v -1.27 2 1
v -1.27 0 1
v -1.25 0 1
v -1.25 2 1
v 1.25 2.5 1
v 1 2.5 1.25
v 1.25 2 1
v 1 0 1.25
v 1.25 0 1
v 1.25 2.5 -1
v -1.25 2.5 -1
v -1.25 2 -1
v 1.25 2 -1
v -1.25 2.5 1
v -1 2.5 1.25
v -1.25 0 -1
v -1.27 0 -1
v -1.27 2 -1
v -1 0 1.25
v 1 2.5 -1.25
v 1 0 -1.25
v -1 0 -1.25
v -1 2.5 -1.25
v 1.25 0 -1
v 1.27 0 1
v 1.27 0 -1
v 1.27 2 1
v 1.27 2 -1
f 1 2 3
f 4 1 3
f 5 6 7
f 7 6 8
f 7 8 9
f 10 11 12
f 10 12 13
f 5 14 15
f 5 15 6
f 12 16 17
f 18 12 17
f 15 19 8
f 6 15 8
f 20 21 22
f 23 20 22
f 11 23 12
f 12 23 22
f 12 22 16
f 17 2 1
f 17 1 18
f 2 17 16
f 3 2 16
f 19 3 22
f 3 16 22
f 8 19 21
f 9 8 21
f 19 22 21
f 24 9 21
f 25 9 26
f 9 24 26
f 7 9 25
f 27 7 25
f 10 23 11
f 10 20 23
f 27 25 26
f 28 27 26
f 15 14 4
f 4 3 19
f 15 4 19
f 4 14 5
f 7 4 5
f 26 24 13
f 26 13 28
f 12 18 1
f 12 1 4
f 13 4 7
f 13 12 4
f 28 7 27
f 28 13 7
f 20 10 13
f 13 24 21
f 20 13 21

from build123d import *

# Parameters (mm, degrees)
SKETCH_1_W          = 0.02
SKETCH_1_H          = 2
SKETCH_1_W_2        = 2.5
EXTRUDE_1_DEPTH     = 2.5
SKETCH_2_W          = 2.54
SKETCH_2_H          = 2
CUT_EXTRUDE_1_DEPTH = 0.5


with BuildPart() as part:
    # Эскиз1 → Бобышка-Вытянуть1 (new body)
    with BuildSketch(Plane(origin=(0, 0, 0), x_dir=(1, 0, 0), z_dir=(0, 1, 0))):
        with Locations((-1.26, 0)):
            Rectangle(SKETCH_1_W, SKETCH_1_H)
        Rectangle(SKETCH_1_W_2, SKETCH_1_H)
        Polygon((-1, 1.25), (-1.25, 1), (1.25, 1), (1, 1.25), align=None)
        with Locations((1.26, 0)):
            Rectangle(SKETCH_1_W, SKETCH_1_H)
        Polygon((1.25, -1), (-1.25, -1), (-1, -1.25), (1, -1.25), align=None)
    extrude(amount=EXTRUDE_1_DEPTH)

    # Эскиз2 → Вырез-Вытянуть1 (cut)
    with BuildSketch(Plane(origin=(0, 2.5, 0), x_dir=(1, 0, 0), z_dir=(0, 1, 0))):
        Rectangle(SKETCH_2_W, SKETCH_2_H)
    extrude(amount=-CUT_EXTRUDE_1_DEPTH, mode=Mode.SUBTRACT)


solid = part.part
